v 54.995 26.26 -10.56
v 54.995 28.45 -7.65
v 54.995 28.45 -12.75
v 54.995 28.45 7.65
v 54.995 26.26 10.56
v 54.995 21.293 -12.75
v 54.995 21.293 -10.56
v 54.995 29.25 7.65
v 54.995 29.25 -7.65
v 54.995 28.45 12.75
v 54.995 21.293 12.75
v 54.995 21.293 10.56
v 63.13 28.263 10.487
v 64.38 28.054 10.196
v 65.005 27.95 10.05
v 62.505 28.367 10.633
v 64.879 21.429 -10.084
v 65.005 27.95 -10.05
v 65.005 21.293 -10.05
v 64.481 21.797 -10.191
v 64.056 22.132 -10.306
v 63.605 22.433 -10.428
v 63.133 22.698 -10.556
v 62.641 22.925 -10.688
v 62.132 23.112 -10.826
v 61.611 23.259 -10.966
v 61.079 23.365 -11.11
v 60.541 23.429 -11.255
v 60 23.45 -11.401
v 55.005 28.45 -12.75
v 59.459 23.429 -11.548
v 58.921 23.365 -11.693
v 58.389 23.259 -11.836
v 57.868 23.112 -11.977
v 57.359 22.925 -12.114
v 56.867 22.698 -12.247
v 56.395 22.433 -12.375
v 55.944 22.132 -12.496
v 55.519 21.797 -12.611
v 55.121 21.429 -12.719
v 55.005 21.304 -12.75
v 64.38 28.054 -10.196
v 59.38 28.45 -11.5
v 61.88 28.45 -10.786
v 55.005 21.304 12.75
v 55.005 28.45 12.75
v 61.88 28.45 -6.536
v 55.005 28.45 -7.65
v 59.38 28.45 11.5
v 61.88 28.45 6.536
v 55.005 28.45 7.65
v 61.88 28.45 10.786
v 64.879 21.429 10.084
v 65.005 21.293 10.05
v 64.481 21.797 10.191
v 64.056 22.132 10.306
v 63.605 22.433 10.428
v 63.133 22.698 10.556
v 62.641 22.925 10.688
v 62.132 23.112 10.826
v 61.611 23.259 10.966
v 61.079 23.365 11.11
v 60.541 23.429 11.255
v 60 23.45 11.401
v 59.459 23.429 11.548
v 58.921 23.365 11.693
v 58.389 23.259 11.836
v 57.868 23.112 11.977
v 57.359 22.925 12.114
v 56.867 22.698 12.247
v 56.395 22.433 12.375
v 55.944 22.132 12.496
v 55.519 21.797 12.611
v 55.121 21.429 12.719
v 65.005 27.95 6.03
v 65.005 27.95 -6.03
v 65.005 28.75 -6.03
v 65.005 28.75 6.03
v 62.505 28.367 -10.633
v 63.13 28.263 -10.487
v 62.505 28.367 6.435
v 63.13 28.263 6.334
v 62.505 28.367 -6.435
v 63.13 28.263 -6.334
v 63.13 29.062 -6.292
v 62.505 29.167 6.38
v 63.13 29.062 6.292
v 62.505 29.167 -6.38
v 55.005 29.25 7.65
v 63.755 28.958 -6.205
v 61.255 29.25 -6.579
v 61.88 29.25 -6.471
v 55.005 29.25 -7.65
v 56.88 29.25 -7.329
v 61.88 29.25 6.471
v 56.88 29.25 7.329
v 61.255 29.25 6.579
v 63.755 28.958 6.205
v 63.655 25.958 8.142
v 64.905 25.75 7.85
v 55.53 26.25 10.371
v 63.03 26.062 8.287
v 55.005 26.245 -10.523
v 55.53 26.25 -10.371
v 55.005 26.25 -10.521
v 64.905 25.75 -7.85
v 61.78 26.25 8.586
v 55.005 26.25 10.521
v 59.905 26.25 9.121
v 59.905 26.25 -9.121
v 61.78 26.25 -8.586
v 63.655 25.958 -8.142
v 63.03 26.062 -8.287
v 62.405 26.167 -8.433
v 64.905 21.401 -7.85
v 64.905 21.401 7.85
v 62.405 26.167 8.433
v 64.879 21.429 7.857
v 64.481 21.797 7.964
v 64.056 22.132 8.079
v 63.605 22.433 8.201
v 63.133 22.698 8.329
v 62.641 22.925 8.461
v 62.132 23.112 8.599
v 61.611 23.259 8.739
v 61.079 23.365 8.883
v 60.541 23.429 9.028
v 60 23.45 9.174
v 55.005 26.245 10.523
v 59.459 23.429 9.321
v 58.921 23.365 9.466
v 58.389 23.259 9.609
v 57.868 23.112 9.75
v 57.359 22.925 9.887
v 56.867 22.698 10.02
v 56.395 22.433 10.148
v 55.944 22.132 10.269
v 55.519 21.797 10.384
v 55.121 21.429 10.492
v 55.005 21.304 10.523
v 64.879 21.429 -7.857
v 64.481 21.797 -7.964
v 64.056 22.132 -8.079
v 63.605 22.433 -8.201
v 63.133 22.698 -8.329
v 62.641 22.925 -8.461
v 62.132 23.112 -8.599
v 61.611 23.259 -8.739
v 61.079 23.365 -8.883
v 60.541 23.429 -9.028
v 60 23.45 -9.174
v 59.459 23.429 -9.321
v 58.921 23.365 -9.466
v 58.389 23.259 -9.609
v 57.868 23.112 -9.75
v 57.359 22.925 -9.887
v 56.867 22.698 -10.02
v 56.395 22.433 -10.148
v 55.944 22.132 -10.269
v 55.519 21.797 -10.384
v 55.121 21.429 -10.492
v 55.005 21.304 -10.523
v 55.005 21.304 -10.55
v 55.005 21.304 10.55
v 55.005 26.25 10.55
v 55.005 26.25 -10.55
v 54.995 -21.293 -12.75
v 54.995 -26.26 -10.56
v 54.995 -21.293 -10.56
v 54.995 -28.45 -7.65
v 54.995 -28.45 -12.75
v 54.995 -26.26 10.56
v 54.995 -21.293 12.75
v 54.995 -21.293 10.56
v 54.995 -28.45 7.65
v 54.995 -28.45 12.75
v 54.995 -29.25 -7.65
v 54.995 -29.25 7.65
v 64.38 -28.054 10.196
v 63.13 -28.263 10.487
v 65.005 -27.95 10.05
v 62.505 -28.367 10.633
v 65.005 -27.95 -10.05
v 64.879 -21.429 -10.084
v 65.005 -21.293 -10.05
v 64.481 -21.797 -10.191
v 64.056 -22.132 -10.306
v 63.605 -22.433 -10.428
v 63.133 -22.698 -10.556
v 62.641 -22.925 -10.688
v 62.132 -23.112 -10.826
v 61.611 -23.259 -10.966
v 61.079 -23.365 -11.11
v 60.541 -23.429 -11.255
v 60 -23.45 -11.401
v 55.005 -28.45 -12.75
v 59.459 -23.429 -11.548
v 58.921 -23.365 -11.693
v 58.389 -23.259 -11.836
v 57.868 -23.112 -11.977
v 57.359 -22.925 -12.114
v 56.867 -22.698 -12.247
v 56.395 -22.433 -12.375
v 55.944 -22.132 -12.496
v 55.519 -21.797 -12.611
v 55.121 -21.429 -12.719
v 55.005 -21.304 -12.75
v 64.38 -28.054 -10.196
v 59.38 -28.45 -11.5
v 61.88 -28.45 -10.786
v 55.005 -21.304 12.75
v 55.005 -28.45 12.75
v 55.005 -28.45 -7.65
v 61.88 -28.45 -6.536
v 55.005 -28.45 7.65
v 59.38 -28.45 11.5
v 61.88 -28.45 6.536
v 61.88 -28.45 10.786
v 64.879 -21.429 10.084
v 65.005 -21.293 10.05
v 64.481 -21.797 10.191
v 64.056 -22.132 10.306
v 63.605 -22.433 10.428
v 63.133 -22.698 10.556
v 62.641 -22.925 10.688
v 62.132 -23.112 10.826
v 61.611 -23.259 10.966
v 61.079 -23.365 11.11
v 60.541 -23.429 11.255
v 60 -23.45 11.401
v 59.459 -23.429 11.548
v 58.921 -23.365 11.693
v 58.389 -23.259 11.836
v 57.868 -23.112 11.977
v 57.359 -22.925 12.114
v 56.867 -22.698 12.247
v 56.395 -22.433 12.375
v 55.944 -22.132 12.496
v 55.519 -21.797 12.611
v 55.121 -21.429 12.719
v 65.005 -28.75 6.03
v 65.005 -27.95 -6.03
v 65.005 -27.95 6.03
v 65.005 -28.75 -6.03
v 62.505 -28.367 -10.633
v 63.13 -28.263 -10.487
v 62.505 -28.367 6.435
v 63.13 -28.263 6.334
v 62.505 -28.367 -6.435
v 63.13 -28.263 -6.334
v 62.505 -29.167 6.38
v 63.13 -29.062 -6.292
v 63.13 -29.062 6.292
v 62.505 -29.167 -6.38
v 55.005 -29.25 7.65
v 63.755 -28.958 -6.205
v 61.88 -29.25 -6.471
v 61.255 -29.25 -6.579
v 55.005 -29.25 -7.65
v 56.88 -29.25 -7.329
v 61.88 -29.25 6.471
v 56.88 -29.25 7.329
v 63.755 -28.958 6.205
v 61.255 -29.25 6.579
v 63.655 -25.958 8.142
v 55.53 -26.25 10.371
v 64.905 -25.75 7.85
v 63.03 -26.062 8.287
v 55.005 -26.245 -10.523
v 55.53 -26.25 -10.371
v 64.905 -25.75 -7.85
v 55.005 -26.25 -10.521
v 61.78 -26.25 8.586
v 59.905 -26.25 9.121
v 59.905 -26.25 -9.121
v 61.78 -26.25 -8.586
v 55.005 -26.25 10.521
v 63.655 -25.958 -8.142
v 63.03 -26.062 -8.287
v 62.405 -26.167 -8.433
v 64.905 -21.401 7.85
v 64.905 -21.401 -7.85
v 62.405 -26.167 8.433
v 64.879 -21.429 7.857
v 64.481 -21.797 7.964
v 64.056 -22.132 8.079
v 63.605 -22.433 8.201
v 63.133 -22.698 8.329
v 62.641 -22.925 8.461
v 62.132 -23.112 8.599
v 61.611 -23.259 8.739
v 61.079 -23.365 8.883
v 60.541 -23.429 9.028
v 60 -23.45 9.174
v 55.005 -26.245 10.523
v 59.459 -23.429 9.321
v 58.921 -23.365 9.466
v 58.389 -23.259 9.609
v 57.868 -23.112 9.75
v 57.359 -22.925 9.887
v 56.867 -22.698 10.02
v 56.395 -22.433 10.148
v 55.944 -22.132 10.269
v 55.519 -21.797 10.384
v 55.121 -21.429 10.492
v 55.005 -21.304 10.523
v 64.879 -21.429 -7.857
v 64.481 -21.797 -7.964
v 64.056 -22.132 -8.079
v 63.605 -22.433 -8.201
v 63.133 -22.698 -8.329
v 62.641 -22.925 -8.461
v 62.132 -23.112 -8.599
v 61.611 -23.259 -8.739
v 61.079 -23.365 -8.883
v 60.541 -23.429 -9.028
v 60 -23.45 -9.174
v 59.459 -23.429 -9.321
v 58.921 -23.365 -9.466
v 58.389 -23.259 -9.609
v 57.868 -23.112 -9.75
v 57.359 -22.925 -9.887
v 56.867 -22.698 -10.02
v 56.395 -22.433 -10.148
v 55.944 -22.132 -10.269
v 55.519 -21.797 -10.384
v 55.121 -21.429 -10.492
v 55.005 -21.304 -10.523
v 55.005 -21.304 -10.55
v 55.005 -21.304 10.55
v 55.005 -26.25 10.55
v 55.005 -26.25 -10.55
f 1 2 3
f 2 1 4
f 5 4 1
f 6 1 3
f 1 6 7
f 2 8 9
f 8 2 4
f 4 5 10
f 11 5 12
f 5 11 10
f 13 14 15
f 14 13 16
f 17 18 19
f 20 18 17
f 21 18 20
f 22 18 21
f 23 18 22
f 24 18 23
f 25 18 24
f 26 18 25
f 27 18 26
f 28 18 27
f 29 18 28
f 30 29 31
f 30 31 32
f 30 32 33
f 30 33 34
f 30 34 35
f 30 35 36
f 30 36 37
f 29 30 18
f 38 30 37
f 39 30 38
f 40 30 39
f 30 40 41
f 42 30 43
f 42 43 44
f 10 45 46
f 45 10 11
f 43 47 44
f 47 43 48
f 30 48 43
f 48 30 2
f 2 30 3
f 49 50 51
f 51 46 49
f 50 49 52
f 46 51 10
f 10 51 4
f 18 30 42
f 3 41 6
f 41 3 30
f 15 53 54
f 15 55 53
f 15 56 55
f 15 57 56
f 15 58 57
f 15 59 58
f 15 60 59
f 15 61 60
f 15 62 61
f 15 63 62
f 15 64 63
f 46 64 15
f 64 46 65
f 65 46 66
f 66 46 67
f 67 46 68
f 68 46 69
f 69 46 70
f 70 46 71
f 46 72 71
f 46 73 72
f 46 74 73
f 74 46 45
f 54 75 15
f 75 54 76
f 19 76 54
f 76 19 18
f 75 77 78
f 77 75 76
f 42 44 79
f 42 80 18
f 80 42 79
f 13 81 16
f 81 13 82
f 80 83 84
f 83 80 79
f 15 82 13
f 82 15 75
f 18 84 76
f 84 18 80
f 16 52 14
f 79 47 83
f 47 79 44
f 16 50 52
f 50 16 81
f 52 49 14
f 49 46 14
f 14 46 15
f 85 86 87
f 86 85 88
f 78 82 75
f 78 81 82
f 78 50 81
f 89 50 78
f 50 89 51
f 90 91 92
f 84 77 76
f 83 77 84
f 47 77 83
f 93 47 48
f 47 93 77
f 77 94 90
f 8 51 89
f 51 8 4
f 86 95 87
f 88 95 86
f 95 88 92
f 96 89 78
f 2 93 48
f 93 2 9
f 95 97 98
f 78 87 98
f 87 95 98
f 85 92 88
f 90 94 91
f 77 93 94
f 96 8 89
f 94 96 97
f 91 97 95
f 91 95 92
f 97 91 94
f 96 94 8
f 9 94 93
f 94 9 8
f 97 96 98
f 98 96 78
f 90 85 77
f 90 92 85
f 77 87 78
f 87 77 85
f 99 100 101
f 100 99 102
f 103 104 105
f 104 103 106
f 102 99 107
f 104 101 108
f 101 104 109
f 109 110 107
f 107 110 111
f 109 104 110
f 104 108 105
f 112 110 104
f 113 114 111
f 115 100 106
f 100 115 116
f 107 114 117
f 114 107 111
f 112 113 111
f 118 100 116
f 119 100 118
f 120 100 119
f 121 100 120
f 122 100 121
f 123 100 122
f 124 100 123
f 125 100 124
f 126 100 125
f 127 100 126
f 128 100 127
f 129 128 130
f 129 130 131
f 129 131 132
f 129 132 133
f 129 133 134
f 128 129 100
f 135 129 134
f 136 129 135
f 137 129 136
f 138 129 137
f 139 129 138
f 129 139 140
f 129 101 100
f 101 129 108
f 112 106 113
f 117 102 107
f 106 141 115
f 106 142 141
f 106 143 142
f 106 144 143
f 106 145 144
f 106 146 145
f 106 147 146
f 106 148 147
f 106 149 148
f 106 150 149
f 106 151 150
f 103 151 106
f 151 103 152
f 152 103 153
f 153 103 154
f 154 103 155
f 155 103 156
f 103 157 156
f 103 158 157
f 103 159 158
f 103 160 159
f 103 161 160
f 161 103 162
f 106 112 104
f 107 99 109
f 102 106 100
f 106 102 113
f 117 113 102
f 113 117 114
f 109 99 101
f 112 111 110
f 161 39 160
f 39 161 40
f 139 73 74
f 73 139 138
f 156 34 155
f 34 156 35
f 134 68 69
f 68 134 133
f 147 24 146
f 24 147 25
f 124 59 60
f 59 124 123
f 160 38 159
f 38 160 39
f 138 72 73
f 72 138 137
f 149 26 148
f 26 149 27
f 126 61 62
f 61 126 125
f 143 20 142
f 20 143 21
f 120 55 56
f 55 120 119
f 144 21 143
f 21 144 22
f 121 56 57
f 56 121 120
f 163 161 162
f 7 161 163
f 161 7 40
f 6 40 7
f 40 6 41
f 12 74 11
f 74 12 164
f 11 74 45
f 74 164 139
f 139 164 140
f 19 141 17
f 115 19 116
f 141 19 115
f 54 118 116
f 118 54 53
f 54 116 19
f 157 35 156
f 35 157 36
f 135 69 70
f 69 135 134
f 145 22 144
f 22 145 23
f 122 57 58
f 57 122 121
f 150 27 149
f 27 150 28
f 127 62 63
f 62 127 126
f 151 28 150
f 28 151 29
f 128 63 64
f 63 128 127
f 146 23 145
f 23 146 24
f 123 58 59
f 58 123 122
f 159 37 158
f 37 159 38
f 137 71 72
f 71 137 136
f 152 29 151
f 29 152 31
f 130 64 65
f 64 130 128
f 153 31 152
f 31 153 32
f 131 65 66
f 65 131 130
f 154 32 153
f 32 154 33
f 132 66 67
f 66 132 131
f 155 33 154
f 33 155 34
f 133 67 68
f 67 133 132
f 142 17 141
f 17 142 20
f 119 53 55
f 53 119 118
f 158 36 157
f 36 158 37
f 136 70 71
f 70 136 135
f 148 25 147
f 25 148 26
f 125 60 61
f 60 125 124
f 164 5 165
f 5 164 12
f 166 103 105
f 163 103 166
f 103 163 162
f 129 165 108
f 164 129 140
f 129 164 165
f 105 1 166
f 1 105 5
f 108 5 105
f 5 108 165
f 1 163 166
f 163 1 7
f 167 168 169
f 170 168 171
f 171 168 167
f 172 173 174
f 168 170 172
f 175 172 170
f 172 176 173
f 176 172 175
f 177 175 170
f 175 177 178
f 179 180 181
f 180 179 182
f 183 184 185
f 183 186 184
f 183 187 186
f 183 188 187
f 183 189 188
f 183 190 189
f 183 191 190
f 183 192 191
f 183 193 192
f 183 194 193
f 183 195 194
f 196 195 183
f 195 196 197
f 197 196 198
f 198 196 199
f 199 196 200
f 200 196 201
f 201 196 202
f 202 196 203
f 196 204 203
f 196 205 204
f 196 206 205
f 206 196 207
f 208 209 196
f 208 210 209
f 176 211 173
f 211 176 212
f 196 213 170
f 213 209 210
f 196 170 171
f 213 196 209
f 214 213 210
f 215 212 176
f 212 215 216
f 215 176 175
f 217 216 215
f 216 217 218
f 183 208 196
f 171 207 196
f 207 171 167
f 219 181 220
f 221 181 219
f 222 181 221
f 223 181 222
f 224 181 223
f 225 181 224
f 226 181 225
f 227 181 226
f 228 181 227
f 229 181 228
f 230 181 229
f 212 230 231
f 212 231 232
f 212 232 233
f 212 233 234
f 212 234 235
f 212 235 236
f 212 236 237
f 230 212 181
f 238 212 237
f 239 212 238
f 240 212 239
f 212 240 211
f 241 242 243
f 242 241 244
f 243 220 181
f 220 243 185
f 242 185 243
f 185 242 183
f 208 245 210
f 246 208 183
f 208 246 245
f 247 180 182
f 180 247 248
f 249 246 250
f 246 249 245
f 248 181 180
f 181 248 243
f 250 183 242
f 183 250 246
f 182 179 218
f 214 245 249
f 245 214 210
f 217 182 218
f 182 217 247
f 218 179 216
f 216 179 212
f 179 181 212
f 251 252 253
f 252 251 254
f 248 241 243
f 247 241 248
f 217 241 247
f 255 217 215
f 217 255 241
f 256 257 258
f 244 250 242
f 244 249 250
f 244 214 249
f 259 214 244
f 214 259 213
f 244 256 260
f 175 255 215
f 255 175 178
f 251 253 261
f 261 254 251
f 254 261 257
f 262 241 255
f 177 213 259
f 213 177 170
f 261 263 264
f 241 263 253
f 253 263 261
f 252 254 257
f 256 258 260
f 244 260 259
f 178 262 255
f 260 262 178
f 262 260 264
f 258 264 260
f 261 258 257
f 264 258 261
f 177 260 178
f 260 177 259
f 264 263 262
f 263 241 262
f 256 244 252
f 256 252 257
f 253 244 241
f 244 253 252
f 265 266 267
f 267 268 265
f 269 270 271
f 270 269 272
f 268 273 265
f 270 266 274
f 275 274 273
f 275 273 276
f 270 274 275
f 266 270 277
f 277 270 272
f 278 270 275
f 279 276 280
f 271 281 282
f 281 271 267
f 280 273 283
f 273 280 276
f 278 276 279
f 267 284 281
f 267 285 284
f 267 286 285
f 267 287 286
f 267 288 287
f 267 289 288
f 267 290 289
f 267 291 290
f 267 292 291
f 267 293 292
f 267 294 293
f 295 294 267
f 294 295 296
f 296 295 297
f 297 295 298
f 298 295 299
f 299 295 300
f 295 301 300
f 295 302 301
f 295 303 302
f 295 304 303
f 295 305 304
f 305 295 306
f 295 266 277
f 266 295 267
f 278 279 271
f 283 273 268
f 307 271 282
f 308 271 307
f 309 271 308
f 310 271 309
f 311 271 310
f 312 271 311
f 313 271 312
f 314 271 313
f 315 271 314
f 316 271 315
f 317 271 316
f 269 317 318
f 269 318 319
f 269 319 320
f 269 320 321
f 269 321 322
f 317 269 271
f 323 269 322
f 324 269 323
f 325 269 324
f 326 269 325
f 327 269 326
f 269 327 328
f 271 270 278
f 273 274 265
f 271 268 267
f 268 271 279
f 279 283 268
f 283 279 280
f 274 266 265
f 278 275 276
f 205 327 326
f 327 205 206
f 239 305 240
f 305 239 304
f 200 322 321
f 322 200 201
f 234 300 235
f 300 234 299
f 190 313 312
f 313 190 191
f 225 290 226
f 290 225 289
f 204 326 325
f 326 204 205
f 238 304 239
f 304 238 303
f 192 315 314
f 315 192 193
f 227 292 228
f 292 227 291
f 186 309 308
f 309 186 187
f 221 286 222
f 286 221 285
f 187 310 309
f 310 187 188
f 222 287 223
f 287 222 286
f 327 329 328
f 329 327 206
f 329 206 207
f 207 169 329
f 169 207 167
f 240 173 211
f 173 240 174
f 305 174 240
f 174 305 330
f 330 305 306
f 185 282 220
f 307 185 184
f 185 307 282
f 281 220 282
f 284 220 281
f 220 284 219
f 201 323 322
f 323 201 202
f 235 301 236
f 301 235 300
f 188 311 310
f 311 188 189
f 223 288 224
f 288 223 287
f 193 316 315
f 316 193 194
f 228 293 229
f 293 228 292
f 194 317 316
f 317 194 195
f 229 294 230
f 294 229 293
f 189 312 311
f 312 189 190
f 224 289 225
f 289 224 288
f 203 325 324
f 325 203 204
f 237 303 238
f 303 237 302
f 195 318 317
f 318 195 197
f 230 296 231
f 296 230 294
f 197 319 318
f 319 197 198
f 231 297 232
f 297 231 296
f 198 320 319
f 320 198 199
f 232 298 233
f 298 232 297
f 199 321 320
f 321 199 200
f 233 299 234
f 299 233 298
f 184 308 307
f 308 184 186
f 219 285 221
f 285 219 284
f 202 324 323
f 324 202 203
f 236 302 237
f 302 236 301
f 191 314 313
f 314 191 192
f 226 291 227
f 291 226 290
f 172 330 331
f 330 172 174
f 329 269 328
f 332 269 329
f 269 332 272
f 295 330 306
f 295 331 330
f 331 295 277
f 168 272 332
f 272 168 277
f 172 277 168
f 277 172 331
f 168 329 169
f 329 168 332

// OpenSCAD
// ============================================================
//  OMX_F Gripper — Tube-Grip Tip Insert
//  Target: 13 mm OD glass test tube held VERTICALLY (tube axis = Z)
//  Zone  : blade X = 55 → 65 mm (finger-local frame)
//  Print : TPU 95A recommended (glass-safe, high friction)
//
//  Geometry logic
//  ─────────────
//  • Insert slides onto blade tip from +X (open end faces housing)
//  • C-clip profile wraps blade in Y and Z → friction fit
//  • Cylindrical cut on inner face (-Y for link6, +Y for link7):
//    half-circle cradle, axis ‖ Z (vertical tube). Two fingers
//    closing combine the two half-cradles into a full circle.
//  • Mirrored in Y for link7 (inner face = +Y)
//  • Top-view of grip: two ] [ profiles cradling a vertical tube.
// ============================================================

// ── USER PARAMETERS ─────────────────────────────────────────

tube_od       = 13.0;   // target tube outer diameter (mm)
tube_clear    = 0.4;    // gap between tube and cradle (mm)
clearance     = 0.25;   // blade fit clearance (mm) — reduce if loose
wall          = 2.2;    // min wall around blade (mm)
clip_lip      = 0.8;    // snap-fit undercut depth on outer Y face (mm)
cradle_x_frac = 0.5;    // tube center along insert X: 0=start, 1=end (0.5=mid)
cradle_sink   = 0.0;    // mm to recess tube center into +Y past inner face
                        //   0 = exact half-cylinder cut (cradle = half tube)
                        //   >0 = deeper bite (more grip, less Y material)
show_phantom  = false;  // show translucent blade for alignment check
which_finger  = "both"; // "link6" | "link7" | "both"

// ── BLADE CROSS-SECTION TABLE (X=55..65 zone only) ──────────
//   [ X, half_Y, half_Z ]
blade_pts = [
    [ 55, 3.5, 10.3 ],
    [ 62, 3.5,  8.3 ],
    [ 65, 3.0,  7.6 ],
];

X_START = 55;
X_END   = 65;
INS_LEN = X_END - X_START;  // 10 mm

// ── DERIVED ──────────────────────────────────────────────────
tube_r   = tube_od / 2;
cradle_r = tube_r + tube_clear;          // cradle radius (cut)
X_CTR    = X_START + cradle_x_frac * INS_LEN;

// ── HELPERS ──────────────────────────────────────────────────
function lerp(a, b, t) = a + (b-a)*t;

// Blade half_Y at local X (linear interp across 3 pts)
function bhy(x) =
    (x <= blade_pts[1][0])
        ? lerp(blade_pts[0][1], blade_pts[1][1],
               (x-blade_pts[0][0])/(blade_pts[1][0]-blade_pts[0][0]))
        : lerp(blade_pts[1][1], blade_pts[2][1],
               (x-blade_pts[1][0])/(blade_pts[2][0]-blade_pts[1][0]));

// Blade half_Z at local X
function bhz(x) =
    (x <= blade_pts[1][0])
        ? lerp(blade_pts[0][2], blade_pts[1][2],
               (x-blade_pts[0][0])/(blade_pts[1][0]-blade_pts[0][0]))
        : lerp(blade_pts[1][2], blade_pts[2][2],
               (x-blade_pts[1][0])/(blade_pts[2][0]-blade_pts[1][0]));

N = 16;  // hull slices

// ── MODULES ──────────────────────────────────────────────────

// Outer body of the insert (blade envelope + wall)
module insert_outer() {
    hull()
        for (i = [0:N]) {
            x = X_START + i * INS_LEN / N;
            hy = bhy(x) + wall + clearance;
            hz = bhz(x) + wall + clearance;
            translate([x, 0, 0])
                cube([0.01, hy*2, hz*2], center=true);
        }
}

// Blade cavity (blade shape + clearance)
module blade_cavity() {
    // Full pass-through cavity — open at X_START end for sliding
    translate([-0.1, 0, 0])   // extend slightly past start
    hull()
        for (i = [0:N]) {
            x = X_START + i * INS_LEN / N;
            hy = bhy(x) + clearance;
            hz = bhz(x) + clearance;
            translate([x, 0, 0])
                cube([0.01, hy*2, hz*2], center=true);
        }
}

// Cylindrical tube cradle — axis ‖ Z (vertical tube).
// Cut center sits on (or sinks past) the inner -Y face; the cylinder
// removes a half-circle bite from the insert in the XY plane. The two
// fingers' bites combine into a full cylinder when the gripper closes.
module tube_cradle() {
    face_y = -(bhy(X_CTR) + wall + clearance);   // inner -Y face at X_CTR
    cy     = face_y + cradle_sink;               // tube axis Y
    // height: full Z extent of insert + margin (cuts through top/bottom)
    h_z = max(bhz(X_START), bhz(X_END)) * 2 + 2*wall + 4*clearance + 10;
    translate([X_CTR, cy, 0])
        cylinder(r = cradle_r, h = h_z, center = true, $fn = 80);
}

// Snap-fit clip lip on outer +Y face (keeps insert from sliding off blade)
module clip_lip() {
    hull()
        for (i = [0:N]) {
            x = X_START + i * INS_LEN / N;
            hy_out = bhy(x) + wall + clearance;
            hz_out = bhz(x) + wall + clearance;
            translate([x, hy_out, 0])
                cube([0.01, clip_lip*2, hz_out*1.2], center=true);
        }
}

// Phantom blade for visual alignment check
module blade_phantom() {
    color("cyan", 0.2)
    hull()
        for (i = [0:N]) {
            x = X_START + i * INS_LEN / N;
            translate([x, 0, 0])
                cube([0.01, bhy(x)*2, bhz(x)*2], center=true);
        }
}

// Entry lead-in: chamfer the open end (X=55 side) so blade slides in
module entry_chamfer() {
    ch = 1.5;  // chamfer size
    hull() {
        // Normal profile at X_START
        translate([X_START, 0, 0]) {
            hy = bhy(X_START) + clearance;
            hz = bhz(X_START) + clearance;
            cube([0.01, hy*2, hz*2], center=true);
        }
        // Enlarged profile slightly before X_START
        translate([X_START - ch, 0, 0]) {
            hy = bhy(X_START) + clearance + ch;
            hz = bhz(X_START) + clearance + ch;
            cube([0.01, hy*2, hz*2], center=true);
        }
    }
}

// Complete insert for link6 (inner = -Y)
module insert_link6() {
    difference() {
        union() {
            insert_outer();
            clip_lip();         // snap ridge on outer +Y
        }
        blade_cavity();
        tube_cradle();      // half-cylinder cut for vertical tube on -Y face
        entry_chamfer();
    }
    if (show_phantom) blade_phantom();
}

// Complete insert for link7 (inner = +Y, mirror of link6)
module insert_link7() {
    scale([1, -1, 1])
        insert_link6();
}

// ── RENDER ───────────────────────────────────────────────────
SEP = 45;  // Y separation when showing both

if (which_finger == "link6") {
    insert_link6();
} else if (which_finger == "link7") {
    insert_link7();
} else {
    translate([0,  SEP/2, 0]) insert_link6();
    translate([0, -SEP/2, 0]) insert_link7();
}

// ============================================================
//  PRINT GUIDE
// ─────────────────────────────────────────────────────────────
//  Material  : TPU 95A  (Shore hardness gives compliance +
//              grip on glass; PLA/PETG alternative if no TPU)
//  Orientation: stand on +X end — Z axis vertical = cradle axis vertical
//              (avoids supports inside the cradle arc).
//  Layer h   : 0.15 mm for smooth cradle surface
//  Walls     : 3 perimeters (no infill needed — solid is fine
//              for such a small part)
//  Supports  : none needed
//
//  FIT TUNING
//  ──────────
//  Too loose on blade → decrease clearance (try 0.15)
//  Too tight          → increase clearance (try 0.35)
//  Clip doesn't snap  → increase clip_lip (try 1.2)
//
//  TUBE CRADLE GEOMETRY (13 mm tube, vertical = Z axis)
//  ─────────────────────────────────────────────────────
//  cradle radius      : 6.5 + tube_clear mm
//  cradle axis        : Z (tube vertical)
//  cradle center X    : X_START + cradle_x_frac * INS_LEN  (default mid)
//  bite shape         : half-cylinder cut into inner Y face
//  → two fingers' bites = full circle around tube when closed
//  → tube extends vertically through the open ends in Z
//
//  GEOMETRY CONSTRAINT
//  ───────────────────
//  Tube radius (6.5 mm) > finger half-Y at tip (~3 mm), so the cradle
//  cuts past the finger centerline in Y. This is expected: the cradle
//  is shared between both fingers when closed. The +Y wall remains
//  ~(half_Z + wall - cradle_r) thick — verify visually before printing.
// ============================================================
